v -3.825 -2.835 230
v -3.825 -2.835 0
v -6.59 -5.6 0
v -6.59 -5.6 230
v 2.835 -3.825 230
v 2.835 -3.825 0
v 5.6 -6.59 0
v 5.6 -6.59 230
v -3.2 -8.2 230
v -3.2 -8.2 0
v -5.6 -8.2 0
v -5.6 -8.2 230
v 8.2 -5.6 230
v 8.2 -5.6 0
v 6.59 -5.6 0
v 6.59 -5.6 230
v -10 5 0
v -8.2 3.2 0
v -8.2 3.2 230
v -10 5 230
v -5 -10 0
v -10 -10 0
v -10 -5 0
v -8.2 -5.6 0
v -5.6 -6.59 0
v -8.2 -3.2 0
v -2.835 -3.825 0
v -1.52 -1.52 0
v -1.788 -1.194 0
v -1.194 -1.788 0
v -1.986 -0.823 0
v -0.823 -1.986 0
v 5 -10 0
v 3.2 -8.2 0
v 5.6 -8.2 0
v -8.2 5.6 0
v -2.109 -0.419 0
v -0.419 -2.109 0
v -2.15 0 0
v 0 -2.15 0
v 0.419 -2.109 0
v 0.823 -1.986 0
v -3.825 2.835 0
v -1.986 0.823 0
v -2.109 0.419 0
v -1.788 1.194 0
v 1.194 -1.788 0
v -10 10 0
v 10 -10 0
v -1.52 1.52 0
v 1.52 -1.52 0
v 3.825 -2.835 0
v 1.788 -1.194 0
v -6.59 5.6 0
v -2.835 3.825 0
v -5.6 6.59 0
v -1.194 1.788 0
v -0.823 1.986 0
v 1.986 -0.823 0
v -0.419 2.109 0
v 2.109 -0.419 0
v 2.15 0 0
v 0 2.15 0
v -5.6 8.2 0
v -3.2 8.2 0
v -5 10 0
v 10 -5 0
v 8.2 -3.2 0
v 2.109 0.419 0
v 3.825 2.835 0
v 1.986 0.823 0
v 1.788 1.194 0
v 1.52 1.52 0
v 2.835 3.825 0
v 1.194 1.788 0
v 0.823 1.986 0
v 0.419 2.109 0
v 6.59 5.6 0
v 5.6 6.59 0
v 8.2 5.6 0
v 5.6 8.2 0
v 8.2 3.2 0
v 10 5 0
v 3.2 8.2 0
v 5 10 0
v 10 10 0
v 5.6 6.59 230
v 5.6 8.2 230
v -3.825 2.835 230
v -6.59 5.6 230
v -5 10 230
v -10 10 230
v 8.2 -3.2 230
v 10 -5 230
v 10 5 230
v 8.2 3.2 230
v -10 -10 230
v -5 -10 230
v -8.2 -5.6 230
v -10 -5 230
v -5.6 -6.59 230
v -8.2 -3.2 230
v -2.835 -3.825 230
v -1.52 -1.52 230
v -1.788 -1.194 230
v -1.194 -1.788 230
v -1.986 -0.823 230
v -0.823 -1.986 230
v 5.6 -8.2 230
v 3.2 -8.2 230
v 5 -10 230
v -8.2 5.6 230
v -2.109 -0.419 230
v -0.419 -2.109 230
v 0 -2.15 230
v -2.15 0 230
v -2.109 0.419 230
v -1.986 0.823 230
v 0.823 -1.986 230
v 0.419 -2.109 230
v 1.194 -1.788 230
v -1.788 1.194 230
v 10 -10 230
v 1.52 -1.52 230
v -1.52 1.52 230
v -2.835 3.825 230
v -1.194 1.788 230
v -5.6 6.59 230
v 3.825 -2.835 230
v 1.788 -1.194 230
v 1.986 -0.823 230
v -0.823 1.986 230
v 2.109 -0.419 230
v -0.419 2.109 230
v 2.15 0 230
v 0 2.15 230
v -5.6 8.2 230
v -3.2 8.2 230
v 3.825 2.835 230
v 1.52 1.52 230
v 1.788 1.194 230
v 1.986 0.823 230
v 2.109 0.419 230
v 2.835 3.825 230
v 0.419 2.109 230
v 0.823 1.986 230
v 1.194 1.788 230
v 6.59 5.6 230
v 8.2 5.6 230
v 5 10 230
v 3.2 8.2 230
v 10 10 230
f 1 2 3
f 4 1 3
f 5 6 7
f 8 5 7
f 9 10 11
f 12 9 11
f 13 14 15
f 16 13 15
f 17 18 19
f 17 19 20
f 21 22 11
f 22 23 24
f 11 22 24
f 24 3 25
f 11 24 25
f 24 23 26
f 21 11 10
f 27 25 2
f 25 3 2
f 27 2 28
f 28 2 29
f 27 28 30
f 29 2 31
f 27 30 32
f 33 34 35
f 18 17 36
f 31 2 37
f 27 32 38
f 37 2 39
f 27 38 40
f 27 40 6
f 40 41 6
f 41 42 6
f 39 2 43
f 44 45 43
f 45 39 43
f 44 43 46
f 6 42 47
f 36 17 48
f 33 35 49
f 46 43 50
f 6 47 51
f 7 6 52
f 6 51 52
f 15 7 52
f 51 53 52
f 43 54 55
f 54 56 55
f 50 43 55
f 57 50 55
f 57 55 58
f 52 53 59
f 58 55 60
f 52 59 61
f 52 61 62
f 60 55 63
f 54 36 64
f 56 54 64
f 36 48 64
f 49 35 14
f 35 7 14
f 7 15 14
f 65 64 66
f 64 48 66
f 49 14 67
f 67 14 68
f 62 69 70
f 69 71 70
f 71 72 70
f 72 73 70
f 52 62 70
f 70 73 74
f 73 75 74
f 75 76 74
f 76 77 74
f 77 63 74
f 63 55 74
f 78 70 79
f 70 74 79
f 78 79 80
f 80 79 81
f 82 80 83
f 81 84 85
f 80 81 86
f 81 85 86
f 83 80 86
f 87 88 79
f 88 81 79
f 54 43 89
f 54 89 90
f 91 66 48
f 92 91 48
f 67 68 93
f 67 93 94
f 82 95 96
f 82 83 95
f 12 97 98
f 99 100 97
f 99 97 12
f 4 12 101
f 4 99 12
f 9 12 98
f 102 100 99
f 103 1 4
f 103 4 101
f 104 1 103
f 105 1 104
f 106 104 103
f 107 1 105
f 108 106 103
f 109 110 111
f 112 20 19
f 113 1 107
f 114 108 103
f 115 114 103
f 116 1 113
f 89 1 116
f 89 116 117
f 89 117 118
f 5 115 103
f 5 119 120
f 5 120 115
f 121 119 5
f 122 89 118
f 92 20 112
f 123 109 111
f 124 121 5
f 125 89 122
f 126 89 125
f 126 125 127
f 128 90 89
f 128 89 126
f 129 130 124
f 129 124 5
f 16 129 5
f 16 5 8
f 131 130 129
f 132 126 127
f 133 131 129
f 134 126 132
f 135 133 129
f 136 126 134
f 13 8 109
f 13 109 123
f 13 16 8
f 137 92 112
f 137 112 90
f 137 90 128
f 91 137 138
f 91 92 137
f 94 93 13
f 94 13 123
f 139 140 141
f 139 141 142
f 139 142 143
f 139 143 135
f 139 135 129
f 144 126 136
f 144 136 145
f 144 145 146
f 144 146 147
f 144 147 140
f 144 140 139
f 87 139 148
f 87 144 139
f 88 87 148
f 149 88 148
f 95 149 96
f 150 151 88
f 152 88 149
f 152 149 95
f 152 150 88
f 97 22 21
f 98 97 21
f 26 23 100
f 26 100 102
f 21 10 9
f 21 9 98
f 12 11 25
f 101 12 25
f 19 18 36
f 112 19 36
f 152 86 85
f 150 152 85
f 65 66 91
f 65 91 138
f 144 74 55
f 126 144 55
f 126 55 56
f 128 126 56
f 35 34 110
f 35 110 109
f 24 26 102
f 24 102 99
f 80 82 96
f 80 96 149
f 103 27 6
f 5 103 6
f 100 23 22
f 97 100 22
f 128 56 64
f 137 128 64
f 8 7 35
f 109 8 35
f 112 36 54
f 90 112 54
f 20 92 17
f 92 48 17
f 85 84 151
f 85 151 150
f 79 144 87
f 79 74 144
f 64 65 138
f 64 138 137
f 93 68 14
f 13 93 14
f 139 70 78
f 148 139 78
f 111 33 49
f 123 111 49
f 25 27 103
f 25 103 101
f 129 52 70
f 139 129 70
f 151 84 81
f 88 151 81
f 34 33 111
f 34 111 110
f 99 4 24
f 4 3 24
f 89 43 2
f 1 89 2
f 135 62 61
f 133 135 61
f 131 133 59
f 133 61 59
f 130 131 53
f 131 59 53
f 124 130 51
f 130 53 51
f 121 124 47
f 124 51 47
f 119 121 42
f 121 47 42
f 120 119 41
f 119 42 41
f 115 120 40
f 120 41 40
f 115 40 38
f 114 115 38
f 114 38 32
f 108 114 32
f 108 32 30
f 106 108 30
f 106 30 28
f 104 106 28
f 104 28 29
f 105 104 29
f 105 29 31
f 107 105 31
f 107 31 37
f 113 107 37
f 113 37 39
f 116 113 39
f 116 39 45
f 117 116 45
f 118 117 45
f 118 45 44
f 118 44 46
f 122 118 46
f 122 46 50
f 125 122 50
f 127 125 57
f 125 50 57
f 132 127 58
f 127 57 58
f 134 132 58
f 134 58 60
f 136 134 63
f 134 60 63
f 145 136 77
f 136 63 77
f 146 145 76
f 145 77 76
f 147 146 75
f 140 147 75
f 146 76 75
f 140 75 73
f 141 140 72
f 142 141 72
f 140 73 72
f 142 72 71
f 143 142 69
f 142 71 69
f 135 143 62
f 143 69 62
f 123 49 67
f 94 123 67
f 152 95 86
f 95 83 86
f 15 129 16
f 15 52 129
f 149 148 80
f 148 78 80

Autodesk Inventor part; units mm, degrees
ref_plane "YZ Plane" through (0, 0, 0) normal (1, 0, 0) x (0, 1, 0)
ref_plane "XZ Plane" through (0, 0, 0) normal (0, 1, 0) x (-1, 0, 0)
ref_plane "XY Plane" through (0, 0, 0) normal (0, 0, 1) x (1, 0, 0)
sketch "Sketch1" plane through (0, 0, 0) normal (0, 0, 1) x (1, 0, 0)
  line L0 (-10, -10) -> (-5.6, -10)
  line L1 (-10, -5.6) -> (-10, -10)
  line L2 (-5.6, -10) -> (-5, -10)
  line L3 (-3.2, -8.2) -> (-5.6, -8.2)
  line L4 (-2.8351, -3.825) -> (-5.6, -6.5899)
  line L5 (-3.825, -2.8351) -> (-6.5899, -5.6)
  line L6 (0, 0) -> (0, -11) construction
  line L7 (0, 0) -> (-12, 0) construction
  line L8 (-3.2, -8.2) -> (-5, -10)
  line L9 (-6.5899, -5.6) -> (-8.2, -5.6)
  line L10 (-10, -5.6) -> (-10, -5)
  line L11 (-10, -5) -> (-8.2, -3.2)
  line L12 (-8.2, -3.2) -> (-8.2, -5.6)
  line L13 (-5.6, -8.2) -> (-5.6, -6.5899)
  arc A0 (-2.15, 0) -> (0, -2.15) centre (0, 0) ccw
  line L14 (0, 0) -> (-3.825, 0)
  line L15 (-3.825, 0) -> (-3.825, -2.8351)
  line L16 (-2.8351, -3.825) -> (0, -3.825)
  line L17 (0, -3.825) -> (0, 0)
  line L18 (-2.8351, -3.825) -> (-3.825, -3.825) construction
  line L19 (-3.825, -3.825) -> (-3.825, -2.8351) construction
  line L20 (3.825, -2.8351) -> (3.825, -3.825) construction
  line L21 (3.825, -2.8351) -> (3.825, 0)
  line L22 (3.825, -3.825) -> (2.8351, -3.825) construction
  line L23 (3.825, 0) -> (0, 0)
  line L24 (0, -3.825) -> (2.8351, -3.825)
  arc A1 (0, -2.15) -> (2.15, 0) centre (0, 0) ccw
  line L25 (0, 0) -> (0, -3.825)
  line L26 (2.8351, -3.825) -> (5.6, -6.5899)
  line L27 (0, 0) -> (0, -12) construction
  line L28 (0, 0) -> (11, 0) construction
  line L29 (3.825, -2.8351) -> (6.5899, -5.6)
  line L30 (8.2, -3.2) -> (8.2, -5.6)
  line L31 (10, -5.6) -> (10, -5)
  line L32 (8.2, -3.2) -> (10, -5)
  line L33 (8.2, -5.6) -> (6.5899, -5.6)
  line L34 (5.6, -6.5899) -> (5.6, -8.2)
  line L35 (10, -10) -> (10, -5.6)
  line L36 (5.6, -10) -> (10, -10)
  line L37 (3.2, -8.2) -> (5.6, -8.2)
  line L38 (5, -10) -> (3.2, -8.2)
  line L39 (5.6, -10) -> (5, -10)
  line L40 (2.8351, 3.825) -> (3.825, 3.825) construction
  line L41 (2.8351, 3.825) -> (0, 3.825)
  line L42 (3.825, 3.825) -> (3.825, 2.8351) construction
  line L43 (0, 3.825) -> (0, 0)
  line L44 (3.825, 0) -> (3.825, 2.8351)
  arc A2 (2.15, 0) -> (0, 2.15) centre (0, 0) ccw
  line L45 (0, 0) -> (3.825, 0)
  line L46 (3.825, 2.8351) -> (6.5899, 5.6)
  line L47 (0, 0) -> (12, 0) construction
  line L48 (0, 0) -> (0, 11) construction
  line L49 (2.8351, 3.825) -> (5.6, 6.5899)
  line L50 (3.2, 8.2) -> (5.6, 8.2)
  line L51 (5.6, 10) -> (5, 10)
  line L52 (3.2, 8.2) -> (5, 10)
  line L53 (5.6, 8.2) -> (5.6, 6.5899)
  line L54 (6.5899, 5.6) -> (8.2, 5.6)
  line L55 (10, 10) -> (5.6, 10)
  line L56 (10, 5.6) -> (10, 10)
  line L57 (8.2, 3.2) -> (8.2, 5.6)
  line L58 (10, 5) -> (8.2, 3.2)
  line L59 (10, 5.6) -> (10, 5)
  line L60 (-3.825, 2.8351) -> (-3.825, 3.825) construction
  line L61 (-3.825, 2.8351) -> (-3.825, 0)
  line L62 (-3.825, 3.825) -> (-2.8351, 3.825) construction
  line L63 (-3.825, 0) -> (0, 0)
  line L64 (0, 3.825) -> (-2.8351, 3.825)
  arc A3 (0, 2.15) -> (-2.15, 0) centre (0, 0) ccw
  line L65 (0, 0) -> (0, 3.825)
  line L66 (-2.8351, 3.825) -> (-5.6, 6.5899)
  line L67 (0, 0) -> (0, 12) construction
  line L68 (0, 0) -> (-11, 0) construction
  line L69 (-3.825, 2.8351) -> (-6.5899, 5.6)
  line L70 (-8.2, 3.2) -> (-8.2, 5.6)
  line L71 (-10, 5.6) -> (-10, 5)
  line L72 (-8.2, 3.2) -> (-10, 5)
  line L73 (-8.2, 5.6) -> (-6.5899, 5.6)
  line L74 (-5.6, 6.5899) -> (-5.6, 8.2)
  line L75 (-10, 10) -> (-10, 5.6)
  line L76 (-5.6, 10) -> (-10, 10)
  line L77 (-3.2, 8.2) -> (-5.6, 8.2)
  line L78 (-5, 10) -> (-3.2, 8.2)
  line L79 (-5.6, 10) -> (-5, 10)
  point P0 (0, 2.15)
  point P1 (2.15, 0)
  point P2 (0, -2.15)
  dimension "d16" = 10
  dimension "d19" = 3.2
  dimension "d21" = 4.4
  dimension "d22" = 4.4
  dimension "d24" = 45
  dimension "d25" = 1.8
  dimension "d27" = 1.8
  dimension "d28" = 45
  dimension "d29" = 3.2
  dimension "d31" = 1.4
  dimension "d33" = 2.15
  dimension "d34" = 3.825
  dimension "d35" = 3.825
  dimension "d36" = 135
  dimension "d39" = 360
extrude "Extrusion1" add sketch "Sketch1" along normal blind 230 contours L1 L10 L11 L12 L9 L5 L15 L14 A0 L17 L16 L4 L13 L3 L8 L2 L0 | L17 A1 L23 L21 L29 L33 L30 L32 L31 L35 L36 L39 L38 L37 L34 L26 L24 | L61 L69 L73 L70 L72 L71 L75 L76 L79 L78 L77 L74 L66 L64 L43 A3 L14 | A2 L43 L41 L49 L53 L50 L52 L51 L55 L56 L59 L58 L57 L54 L46 L44 L23
properties part number "AP20x20"
